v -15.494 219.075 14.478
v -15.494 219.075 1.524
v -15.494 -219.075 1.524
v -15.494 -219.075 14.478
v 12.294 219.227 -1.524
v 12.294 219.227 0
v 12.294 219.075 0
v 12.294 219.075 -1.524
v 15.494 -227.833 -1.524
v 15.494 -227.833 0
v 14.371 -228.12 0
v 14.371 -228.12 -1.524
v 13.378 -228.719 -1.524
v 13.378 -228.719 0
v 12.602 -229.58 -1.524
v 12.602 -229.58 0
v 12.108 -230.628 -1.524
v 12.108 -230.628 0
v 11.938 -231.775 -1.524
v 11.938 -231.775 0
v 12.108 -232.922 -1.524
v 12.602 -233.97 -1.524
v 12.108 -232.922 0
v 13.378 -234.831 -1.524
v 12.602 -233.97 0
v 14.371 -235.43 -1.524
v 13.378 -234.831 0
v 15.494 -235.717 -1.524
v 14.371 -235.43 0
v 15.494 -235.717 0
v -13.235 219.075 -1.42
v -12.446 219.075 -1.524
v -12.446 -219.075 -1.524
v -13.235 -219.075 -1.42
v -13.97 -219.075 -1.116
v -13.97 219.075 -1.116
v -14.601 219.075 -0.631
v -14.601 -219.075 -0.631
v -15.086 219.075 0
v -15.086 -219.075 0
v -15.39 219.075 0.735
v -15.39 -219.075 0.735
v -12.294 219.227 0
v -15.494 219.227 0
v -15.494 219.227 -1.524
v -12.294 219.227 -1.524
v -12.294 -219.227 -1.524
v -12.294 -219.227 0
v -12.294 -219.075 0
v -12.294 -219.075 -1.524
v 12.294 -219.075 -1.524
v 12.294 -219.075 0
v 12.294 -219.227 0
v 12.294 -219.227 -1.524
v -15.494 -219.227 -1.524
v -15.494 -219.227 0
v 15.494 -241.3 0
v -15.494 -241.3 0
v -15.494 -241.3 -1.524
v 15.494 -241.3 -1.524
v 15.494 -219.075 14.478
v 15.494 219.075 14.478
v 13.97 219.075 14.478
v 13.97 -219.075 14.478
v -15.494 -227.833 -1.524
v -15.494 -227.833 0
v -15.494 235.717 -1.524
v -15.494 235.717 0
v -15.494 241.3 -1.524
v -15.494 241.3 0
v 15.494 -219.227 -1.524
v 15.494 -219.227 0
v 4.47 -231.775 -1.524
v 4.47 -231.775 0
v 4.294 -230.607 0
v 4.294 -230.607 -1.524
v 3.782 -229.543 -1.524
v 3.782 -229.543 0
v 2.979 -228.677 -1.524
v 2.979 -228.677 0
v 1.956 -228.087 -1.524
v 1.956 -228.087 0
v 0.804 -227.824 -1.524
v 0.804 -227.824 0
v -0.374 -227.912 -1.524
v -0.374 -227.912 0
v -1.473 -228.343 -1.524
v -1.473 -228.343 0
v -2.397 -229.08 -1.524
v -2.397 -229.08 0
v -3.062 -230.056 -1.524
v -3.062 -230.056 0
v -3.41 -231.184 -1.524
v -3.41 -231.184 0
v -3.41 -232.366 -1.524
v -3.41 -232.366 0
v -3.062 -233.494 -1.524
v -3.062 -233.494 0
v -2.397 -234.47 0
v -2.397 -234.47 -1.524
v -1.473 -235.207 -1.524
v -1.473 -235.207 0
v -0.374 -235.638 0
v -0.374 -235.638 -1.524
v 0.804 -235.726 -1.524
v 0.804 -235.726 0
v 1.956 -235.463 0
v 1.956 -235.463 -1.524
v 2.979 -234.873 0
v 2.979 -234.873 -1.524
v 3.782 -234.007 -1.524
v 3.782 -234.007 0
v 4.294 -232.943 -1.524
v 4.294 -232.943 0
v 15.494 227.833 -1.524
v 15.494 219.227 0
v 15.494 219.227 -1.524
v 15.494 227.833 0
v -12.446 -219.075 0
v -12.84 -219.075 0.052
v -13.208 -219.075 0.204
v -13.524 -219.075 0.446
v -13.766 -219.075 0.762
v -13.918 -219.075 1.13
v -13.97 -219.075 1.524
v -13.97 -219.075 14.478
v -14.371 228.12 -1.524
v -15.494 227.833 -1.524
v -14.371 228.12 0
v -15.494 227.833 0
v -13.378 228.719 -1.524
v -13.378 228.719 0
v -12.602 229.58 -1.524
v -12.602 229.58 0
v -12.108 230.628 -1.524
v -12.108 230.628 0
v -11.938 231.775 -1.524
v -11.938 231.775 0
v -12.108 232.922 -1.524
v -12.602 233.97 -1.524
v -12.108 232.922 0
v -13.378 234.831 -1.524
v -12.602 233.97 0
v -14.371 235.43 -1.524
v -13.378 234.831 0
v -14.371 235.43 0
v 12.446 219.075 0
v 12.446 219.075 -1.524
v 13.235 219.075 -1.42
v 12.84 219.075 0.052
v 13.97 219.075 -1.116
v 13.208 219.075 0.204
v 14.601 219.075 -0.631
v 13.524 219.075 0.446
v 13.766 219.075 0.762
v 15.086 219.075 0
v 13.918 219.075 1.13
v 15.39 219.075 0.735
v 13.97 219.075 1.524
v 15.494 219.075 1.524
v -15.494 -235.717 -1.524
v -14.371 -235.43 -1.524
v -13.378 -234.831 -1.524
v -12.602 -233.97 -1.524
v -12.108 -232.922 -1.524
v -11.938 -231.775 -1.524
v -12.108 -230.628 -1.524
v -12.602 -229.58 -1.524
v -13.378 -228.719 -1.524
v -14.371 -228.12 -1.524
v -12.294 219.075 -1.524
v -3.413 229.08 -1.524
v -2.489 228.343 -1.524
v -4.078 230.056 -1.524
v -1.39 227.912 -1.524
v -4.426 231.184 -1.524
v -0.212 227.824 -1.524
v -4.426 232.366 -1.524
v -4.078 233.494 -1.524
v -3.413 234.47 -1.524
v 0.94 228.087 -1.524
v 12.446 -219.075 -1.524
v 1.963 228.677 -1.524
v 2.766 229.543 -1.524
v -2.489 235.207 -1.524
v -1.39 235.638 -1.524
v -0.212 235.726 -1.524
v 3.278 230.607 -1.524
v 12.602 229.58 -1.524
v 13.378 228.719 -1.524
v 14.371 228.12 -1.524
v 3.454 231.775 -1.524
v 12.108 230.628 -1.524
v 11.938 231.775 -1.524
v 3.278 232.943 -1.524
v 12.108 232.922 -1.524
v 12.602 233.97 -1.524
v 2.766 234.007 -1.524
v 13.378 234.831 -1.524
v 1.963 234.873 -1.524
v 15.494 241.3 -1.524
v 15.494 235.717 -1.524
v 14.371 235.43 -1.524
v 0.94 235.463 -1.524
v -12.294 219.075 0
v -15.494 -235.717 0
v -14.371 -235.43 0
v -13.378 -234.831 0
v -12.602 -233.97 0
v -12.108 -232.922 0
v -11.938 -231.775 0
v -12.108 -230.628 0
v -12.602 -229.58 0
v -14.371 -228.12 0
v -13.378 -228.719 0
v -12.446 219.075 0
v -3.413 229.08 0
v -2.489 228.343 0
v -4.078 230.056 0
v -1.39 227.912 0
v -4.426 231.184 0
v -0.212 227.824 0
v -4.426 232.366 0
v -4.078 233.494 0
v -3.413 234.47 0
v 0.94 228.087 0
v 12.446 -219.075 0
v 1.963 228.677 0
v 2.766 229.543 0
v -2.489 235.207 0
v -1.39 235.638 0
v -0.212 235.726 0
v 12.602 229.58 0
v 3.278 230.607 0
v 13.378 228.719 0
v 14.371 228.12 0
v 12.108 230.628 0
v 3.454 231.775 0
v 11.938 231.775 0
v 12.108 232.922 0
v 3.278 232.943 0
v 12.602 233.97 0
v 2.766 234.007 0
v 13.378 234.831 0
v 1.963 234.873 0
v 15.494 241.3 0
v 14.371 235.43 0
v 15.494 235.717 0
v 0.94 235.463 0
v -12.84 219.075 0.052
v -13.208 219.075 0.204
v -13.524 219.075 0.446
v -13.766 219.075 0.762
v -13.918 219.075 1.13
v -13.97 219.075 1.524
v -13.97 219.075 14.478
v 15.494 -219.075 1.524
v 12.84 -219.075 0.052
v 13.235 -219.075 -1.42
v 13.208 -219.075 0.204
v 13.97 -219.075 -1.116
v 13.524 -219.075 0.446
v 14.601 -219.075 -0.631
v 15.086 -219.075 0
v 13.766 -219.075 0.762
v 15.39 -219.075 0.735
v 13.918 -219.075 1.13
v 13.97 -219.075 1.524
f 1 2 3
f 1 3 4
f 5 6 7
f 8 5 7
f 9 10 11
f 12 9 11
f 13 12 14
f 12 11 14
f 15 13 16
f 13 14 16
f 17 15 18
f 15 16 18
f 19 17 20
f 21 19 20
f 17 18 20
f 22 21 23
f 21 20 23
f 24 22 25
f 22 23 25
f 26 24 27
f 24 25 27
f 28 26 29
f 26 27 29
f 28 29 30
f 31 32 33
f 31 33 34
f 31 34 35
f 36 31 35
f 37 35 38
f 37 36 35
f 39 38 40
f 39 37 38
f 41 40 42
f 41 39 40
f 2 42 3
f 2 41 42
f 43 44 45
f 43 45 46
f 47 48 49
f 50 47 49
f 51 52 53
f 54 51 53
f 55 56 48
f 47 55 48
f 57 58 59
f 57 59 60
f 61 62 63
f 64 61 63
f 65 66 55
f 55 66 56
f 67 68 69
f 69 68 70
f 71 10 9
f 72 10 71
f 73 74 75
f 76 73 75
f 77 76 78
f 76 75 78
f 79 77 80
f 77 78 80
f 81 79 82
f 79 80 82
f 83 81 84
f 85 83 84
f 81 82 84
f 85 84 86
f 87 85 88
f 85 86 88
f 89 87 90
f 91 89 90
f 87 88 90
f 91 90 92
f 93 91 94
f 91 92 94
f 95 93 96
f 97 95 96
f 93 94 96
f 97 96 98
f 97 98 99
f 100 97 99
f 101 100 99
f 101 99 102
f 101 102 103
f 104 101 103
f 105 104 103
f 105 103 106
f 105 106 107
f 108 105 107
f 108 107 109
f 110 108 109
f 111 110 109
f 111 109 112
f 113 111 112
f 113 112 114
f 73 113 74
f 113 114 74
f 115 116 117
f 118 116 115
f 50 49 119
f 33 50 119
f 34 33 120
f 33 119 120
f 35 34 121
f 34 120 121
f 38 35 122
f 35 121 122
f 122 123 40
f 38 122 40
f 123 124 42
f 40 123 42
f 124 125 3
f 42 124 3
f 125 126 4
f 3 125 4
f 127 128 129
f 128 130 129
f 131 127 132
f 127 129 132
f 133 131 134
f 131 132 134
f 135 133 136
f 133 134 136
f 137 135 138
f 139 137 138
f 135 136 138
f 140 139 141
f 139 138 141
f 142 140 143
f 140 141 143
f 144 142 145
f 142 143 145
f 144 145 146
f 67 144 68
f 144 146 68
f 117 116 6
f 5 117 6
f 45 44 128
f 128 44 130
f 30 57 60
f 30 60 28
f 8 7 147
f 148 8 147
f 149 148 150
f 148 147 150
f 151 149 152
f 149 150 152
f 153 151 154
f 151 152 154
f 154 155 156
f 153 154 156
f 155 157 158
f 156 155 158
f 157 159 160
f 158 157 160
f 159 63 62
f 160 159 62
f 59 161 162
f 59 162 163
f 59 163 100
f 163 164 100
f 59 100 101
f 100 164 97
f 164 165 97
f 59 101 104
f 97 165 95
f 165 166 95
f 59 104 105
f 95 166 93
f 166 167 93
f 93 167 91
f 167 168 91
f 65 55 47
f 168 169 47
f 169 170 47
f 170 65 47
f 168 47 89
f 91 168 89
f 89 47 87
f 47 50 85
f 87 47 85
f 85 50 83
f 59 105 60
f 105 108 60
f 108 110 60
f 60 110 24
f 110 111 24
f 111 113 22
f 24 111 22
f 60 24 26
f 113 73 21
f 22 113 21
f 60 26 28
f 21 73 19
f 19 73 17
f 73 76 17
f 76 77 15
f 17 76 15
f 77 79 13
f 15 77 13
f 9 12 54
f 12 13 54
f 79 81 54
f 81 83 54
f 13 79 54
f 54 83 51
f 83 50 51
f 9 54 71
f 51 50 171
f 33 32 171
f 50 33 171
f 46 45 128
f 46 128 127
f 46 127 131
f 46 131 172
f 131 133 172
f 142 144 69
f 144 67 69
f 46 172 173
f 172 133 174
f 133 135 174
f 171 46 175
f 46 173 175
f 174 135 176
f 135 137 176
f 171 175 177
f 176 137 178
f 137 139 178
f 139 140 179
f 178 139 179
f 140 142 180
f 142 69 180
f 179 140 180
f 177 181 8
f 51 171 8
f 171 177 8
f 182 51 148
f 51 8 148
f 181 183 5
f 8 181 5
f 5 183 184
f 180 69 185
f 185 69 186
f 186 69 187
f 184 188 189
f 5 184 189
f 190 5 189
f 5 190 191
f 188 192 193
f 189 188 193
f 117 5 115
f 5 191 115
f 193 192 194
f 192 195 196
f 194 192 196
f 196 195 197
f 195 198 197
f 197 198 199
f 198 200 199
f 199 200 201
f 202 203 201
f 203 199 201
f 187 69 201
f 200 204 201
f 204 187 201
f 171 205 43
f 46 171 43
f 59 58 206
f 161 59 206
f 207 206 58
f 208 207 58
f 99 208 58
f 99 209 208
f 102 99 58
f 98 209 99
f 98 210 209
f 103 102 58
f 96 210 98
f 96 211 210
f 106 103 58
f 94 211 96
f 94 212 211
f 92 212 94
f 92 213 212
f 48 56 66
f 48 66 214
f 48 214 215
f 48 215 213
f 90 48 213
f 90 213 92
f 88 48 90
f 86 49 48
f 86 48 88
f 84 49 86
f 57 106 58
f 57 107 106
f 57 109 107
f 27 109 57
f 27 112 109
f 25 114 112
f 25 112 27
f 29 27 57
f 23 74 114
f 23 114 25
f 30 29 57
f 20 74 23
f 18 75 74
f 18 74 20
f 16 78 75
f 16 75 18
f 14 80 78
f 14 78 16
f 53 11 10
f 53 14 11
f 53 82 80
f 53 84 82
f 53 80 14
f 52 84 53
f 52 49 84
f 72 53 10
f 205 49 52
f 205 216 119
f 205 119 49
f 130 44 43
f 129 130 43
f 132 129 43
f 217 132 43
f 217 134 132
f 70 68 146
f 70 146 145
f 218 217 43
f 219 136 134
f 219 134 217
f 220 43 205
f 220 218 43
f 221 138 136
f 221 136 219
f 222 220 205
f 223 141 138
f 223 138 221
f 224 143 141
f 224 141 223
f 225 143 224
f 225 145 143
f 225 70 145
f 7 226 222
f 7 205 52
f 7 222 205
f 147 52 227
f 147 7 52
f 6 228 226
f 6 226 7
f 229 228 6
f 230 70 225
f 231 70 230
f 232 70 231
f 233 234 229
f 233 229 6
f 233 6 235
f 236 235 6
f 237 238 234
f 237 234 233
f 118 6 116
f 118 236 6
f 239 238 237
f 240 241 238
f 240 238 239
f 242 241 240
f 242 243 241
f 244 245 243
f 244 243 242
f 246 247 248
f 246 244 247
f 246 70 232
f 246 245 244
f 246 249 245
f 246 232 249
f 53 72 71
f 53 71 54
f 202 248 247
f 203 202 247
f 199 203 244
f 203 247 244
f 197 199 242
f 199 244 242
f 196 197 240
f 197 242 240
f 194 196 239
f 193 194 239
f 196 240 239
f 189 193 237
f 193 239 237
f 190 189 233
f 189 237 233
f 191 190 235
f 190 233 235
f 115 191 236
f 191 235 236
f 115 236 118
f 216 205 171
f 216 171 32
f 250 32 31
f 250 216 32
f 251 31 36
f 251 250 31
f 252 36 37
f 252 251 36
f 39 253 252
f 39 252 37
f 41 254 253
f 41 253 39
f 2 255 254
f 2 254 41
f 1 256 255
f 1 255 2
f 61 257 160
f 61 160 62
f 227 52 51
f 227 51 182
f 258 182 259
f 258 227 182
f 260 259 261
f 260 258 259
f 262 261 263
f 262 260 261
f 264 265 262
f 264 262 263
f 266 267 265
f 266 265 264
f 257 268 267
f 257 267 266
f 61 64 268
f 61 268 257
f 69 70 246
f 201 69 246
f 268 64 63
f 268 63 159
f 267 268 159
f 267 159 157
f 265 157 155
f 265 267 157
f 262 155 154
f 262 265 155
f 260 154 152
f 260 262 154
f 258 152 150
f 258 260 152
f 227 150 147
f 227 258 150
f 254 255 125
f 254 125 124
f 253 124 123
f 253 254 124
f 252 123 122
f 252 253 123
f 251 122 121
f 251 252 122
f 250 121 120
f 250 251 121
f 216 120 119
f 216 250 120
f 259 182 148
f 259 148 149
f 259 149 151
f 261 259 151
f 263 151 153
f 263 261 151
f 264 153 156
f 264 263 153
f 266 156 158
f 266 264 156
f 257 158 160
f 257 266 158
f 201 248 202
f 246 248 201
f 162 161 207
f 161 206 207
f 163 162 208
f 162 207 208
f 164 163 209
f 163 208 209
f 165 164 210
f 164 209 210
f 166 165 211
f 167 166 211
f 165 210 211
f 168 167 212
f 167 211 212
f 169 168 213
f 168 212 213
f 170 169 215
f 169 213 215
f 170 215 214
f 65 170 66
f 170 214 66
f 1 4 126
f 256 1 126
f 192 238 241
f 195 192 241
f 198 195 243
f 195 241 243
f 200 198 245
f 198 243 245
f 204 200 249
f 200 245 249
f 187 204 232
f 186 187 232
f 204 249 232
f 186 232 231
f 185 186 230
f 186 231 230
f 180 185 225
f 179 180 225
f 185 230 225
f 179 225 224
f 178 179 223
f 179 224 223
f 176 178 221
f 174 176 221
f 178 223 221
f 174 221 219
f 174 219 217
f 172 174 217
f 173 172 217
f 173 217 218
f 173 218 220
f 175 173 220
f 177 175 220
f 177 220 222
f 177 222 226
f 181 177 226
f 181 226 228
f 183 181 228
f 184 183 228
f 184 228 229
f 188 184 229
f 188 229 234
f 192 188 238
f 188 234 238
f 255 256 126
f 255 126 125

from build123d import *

# Parameters (mm, degrees)
CROQUIS1_W                          = 30.988
CROQUIS1_H                          = 482.6
CROQUIS1_R                          = 3.9624
BRIDA_BASE1_DEPTH                   = 1.524
BRIDA_DE_ARISTA1_STRIP_W            = 9.144
BRIDA_DE_ARISTA1_STRIP_H            = 1.524
BRIDA_DE_ARISTA1_STRIP_CUT_DEPTH    = 438.15
BRIDA_DE_ARISTA1_RELIEF_W           = 9.2964
BRIDA_DE_ARISTA1_RELIEF_H           = 0.1524
BRIDA_DE_ARISTA1_RELIEF_CUT_DEPTH   = 1.524
BRIDA_DE_ARISTA1_STRIP_2_W          = 9.144
BRIDA_DE_ARISTA1_STRIP_2_H          = 1.524
BRIDA_DE_ARISTA1_STRIP_CUT_2_DEPTH  = 438.15
BRIDA_DE_ARISTA1_RELIEF_2_W         = 9.2964
BRIDA_DE_ARISTA1_RELIEF_2_H         = 0.1524
BRIDA_DE_ARISTA1_RELIEF_CUT_2_DEPTH = 1.524
BRIDA_DE_ARISTA1_DEPTH              = 438.15
BRIDA_DE_ARISTA1_BEND_DEPTH         = 438.15
CROQUIS15_R                         = 3.9624
CORTAR_EXTRUIR1_DEPTH               = 243.229986831


# Sheet-metal steps are written as plain solids
with BuildPart() as part:
    # Croquis1 → Brida base1 (new body)
    with BuildSketch(Plane.XY):
        Rectangle(CROQUIS1_W, CROQUIS1_H)
        with Locations((-0.508, 231.775)):
            Circle(CROQUIS1_R, mode=Mode.SUBTRACT)
        with Locations((0.508, -231.775)):
            Circle(CROQUIS1_R, mode=Mode.SUBTRACT)
    extrude(amount=-BRIDA_BASE1_DEPTH)

    # Brida de arista1 strip (across the edge) → Brida de arista1 strip cut (cut)
    with BuildSketch(Plane(origin=(15.494, -219.075, 0), x_dir=(-1, 0, 0), z_dir=(0, 1, 0))):
        with Locations((-1.524, -0.762)):
            Rectangle(BRIDA_DE_ARISTA1_STRIP_W, BRIDA_DE_ARISTA1_STRIP_H)
    extrude(amount=BRIDA_DE_ARISTA1_STRIP_CUT_DEPTH, mode=Mode.SUBTRACT)

    # Brida de arista1 relief (on the sheet) → Brida de arista1 relief cut (cut)
    with BuildSketch(Plane(origin=(12.446, -219.075, 0), x_dir=(-1, 0, 0), z_dir=(0, 0, 1))):
        with Locations((-4.4958, 0.0762)):
            Rectangle(BRIDA_DE_ARISTA1_RELIEF_W, BRIDA_DE_ARISTA1_RELIEF_H)
        with Locations((-4.4958, -438.2262)):
            Rectangle(BRIDA_DE_ARISTA1_RELIEF_W, BRIDA_DE_ARISTA1_RELIEF_H)
    extrude(amount=-BRIDA_DE_ARISTA1_RELIEF_CUT_DEPTH, mode=Mode.SUBTRACT)

    # Brida de arista1 strip 2 (across the edge) → Brida de arista1 strip cut 2 (cut)
    with BuildSketch(Plane(origin=(-15.494, 219.075, 0), x_dir=(1, 0, 0), z_dir=(0, -1, 0))):
        with Locations((-1.524, -0.762)):
            Rectangle(BRIDA_DE_ARISTA1_STRIP_2_W, BRIDA_DE_ARISTA1_STRIP_2_H)
    extrude(amount=BRIDA_DE_ARISTA1_STRIP_CUT_2_DEPTH, mode=Mode.SUBTRACT)

    # Brida de arista1 relief 2 (on the sheet) → Brida de arista1 relief cut 2 (cut)
    with BuildSketch(Plane(origin=(-12.446, 219.075, 0), x_dir=(1, 0, 0), z_dir=(0, 0, 1))):
        with Locations((-4.4958, 0.0762)):
            Rectangle(BRIDA_DE_ARISTA1_RELIEF_2_W, BRIDA_DE_ARISTA1_RELIEF_2_H)
        with Locations((-4.4958, -438.2262)):
            Rectangle(BRIDA_DE_ARISTA1_RELIEF_2_W, BRIDA_DE_ARISTA1_RELIEF_2_H)
    extrude(amount=-BRIDA_DE_ARISTA1_RELIEF_CUT_2_DEPTH, mode=Mode.SUBTRACT)

    # Brida de arista1 section (across the edge) → Brida de arista1 (add)
    with BuildSketch(Plane(origin=(15.494, -219.075, 0), x_dir=(-1, 0, 0), z_dir=(0, 1, 0))):
        with BuildLine():
            Line((0, 1.524), (0, 14.478))
            Line((0, 14.478), (1.524, 14.478))
            Line((1.524, 14.478), (1.524, 1.524))
            ThreePointArc((1.524, 1.524), (1.970369265, 0.446369265), (3.048, 0))
            Line((3.048, 0), (3.048, -1.524))
            ThreePointArc((3.048, -1.524), (0.892738531, -0.631261469), (0, 1.524))
        make_face()
    extrude(amount=BRIDA_DE_ARISTA1_DEPTH)

    # Brida de arista1 section 2 (across the edge) → Brida de arista1 bend (add)
    with BuildSketch(Plane(origin=(-15.494, 219.075, 0), x_dir=(1, 0, 0), z_dir=(0, -1, 0))):
        with BuildLine():
            Line((0, 1.524), (0, 14.478))
            Line((0, 14.478), (1.524, 14.478))
            Line((1.524, 14.478), (1.524, 1.524))
            ThreePointArc((1.524, 1.524), (1.970369265, 0.446369265), (3.048, 0))
            Line((3.048, 0), (3.048, -1.524))
            ThreePointArc((3.048, -1.524), (0.892738531, -0.631261469), (0, 1.524))
        make_face()
    extrude(amount=BRIDA_DE_ARISTA1_BEND_DEPTH)

    # Croquis15 → Cortar-Extruir1 (cut, through all)
    with BuildSketch(Plane.XY):
        with Locations((-15.9004, 231.775)):
            Circle(CROQUIS15_R)
        with Locations((-15.9004, -231.775)):
            Circle(CROQUIS15_R)
        with Locations((15.9004, -231.775)):
            Circle(CROQUIS15_R)
        with Locations((15.9004, 231.775)):
            Circle(CROQUIS15_R)
    extrude(amount=-CORTAR_EXTRUIR1_DEPTH, mode=Mode.SUBTRACT)


solid = part.part
